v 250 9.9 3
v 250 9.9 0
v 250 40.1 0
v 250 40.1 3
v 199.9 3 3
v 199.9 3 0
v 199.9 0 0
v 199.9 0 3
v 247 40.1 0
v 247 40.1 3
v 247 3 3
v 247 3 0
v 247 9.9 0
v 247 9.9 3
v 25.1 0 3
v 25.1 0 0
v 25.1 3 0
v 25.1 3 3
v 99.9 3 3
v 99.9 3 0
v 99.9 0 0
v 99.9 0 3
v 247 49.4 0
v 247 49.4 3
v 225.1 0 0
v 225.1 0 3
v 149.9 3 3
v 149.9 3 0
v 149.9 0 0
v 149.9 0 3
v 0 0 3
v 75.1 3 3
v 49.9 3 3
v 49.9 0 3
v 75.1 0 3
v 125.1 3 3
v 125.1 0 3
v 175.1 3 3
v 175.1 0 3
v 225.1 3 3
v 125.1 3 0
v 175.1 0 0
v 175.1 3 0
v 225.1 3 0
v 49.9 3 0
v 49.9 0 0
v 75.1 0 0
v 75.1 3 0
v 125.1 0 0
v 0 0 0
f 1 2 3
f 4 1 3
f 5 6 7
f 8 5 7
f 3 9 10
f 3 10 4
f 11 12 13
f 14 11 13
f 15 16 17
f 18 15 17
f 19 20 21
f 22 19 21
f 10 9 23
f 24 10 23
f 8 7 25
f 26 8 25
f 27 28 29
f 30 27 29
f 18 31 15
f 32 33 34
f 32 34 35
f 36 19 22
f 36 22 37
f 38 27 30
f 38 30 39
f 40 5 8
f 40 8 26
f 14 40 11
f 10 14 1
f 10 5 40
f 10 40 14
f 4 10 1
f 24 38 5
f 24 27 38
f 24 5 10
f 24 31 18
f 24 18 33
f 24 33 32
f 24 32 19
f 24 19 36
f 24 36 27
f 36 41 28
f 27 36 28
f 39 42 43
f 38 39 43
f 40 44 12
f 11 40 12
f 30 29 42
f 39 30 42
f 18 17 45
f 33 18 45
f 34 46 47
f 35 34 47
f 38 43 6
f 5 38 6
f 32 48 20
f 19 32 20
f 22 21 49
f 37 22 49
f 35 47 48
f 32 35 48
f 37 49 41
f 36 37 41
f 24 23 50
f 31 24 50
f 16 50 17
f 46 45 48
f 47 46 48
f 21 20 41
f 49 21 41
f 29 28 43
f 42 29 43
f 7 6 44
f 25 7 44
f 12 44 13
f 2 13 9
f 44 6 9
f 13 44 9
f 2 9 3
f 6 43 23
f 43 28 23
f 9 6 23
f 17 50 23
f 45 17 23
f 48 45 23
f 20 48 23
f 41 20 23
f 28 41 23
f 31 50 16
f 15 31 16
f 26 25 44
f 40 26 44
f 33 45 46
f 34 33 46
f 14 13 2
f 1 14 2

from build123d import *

# Parameters (mm, degrees)
SKETCH1_W           = 3
SKETCH1_H           = 30.2
BOSS_EXTRUDE1_DEPTH = 3


with BuildPart() as part:
    # Sketch1 → Boss-Extrude1 (new body)
    with BuildSketch(Plane.XY):
        Polygon((247, 49.4), (0, 0), (25.1, 0), (25.1, 3), (49.9, 3), (49.9, 0), (75.1, 0), (75.1, 3), (99.9, 3), (99.9, 0), (125.1, 0), (125.1, 3), (149.9, 3), (149.9, 0), (175.1, 0), (175.1, 3), (199.9, 3), (199.9, 0), (225.1, 0), (225.1, 3), (247, 3), (247, 9.9), (247, 40.1), align=None)
        with Locations((248.5, 25)):
            Rectangle(SKETCH1_W, SKETCH1_H)
    extrude(amount=BOSS_EXTRUDE1_DEPTH)


solid = part.part
